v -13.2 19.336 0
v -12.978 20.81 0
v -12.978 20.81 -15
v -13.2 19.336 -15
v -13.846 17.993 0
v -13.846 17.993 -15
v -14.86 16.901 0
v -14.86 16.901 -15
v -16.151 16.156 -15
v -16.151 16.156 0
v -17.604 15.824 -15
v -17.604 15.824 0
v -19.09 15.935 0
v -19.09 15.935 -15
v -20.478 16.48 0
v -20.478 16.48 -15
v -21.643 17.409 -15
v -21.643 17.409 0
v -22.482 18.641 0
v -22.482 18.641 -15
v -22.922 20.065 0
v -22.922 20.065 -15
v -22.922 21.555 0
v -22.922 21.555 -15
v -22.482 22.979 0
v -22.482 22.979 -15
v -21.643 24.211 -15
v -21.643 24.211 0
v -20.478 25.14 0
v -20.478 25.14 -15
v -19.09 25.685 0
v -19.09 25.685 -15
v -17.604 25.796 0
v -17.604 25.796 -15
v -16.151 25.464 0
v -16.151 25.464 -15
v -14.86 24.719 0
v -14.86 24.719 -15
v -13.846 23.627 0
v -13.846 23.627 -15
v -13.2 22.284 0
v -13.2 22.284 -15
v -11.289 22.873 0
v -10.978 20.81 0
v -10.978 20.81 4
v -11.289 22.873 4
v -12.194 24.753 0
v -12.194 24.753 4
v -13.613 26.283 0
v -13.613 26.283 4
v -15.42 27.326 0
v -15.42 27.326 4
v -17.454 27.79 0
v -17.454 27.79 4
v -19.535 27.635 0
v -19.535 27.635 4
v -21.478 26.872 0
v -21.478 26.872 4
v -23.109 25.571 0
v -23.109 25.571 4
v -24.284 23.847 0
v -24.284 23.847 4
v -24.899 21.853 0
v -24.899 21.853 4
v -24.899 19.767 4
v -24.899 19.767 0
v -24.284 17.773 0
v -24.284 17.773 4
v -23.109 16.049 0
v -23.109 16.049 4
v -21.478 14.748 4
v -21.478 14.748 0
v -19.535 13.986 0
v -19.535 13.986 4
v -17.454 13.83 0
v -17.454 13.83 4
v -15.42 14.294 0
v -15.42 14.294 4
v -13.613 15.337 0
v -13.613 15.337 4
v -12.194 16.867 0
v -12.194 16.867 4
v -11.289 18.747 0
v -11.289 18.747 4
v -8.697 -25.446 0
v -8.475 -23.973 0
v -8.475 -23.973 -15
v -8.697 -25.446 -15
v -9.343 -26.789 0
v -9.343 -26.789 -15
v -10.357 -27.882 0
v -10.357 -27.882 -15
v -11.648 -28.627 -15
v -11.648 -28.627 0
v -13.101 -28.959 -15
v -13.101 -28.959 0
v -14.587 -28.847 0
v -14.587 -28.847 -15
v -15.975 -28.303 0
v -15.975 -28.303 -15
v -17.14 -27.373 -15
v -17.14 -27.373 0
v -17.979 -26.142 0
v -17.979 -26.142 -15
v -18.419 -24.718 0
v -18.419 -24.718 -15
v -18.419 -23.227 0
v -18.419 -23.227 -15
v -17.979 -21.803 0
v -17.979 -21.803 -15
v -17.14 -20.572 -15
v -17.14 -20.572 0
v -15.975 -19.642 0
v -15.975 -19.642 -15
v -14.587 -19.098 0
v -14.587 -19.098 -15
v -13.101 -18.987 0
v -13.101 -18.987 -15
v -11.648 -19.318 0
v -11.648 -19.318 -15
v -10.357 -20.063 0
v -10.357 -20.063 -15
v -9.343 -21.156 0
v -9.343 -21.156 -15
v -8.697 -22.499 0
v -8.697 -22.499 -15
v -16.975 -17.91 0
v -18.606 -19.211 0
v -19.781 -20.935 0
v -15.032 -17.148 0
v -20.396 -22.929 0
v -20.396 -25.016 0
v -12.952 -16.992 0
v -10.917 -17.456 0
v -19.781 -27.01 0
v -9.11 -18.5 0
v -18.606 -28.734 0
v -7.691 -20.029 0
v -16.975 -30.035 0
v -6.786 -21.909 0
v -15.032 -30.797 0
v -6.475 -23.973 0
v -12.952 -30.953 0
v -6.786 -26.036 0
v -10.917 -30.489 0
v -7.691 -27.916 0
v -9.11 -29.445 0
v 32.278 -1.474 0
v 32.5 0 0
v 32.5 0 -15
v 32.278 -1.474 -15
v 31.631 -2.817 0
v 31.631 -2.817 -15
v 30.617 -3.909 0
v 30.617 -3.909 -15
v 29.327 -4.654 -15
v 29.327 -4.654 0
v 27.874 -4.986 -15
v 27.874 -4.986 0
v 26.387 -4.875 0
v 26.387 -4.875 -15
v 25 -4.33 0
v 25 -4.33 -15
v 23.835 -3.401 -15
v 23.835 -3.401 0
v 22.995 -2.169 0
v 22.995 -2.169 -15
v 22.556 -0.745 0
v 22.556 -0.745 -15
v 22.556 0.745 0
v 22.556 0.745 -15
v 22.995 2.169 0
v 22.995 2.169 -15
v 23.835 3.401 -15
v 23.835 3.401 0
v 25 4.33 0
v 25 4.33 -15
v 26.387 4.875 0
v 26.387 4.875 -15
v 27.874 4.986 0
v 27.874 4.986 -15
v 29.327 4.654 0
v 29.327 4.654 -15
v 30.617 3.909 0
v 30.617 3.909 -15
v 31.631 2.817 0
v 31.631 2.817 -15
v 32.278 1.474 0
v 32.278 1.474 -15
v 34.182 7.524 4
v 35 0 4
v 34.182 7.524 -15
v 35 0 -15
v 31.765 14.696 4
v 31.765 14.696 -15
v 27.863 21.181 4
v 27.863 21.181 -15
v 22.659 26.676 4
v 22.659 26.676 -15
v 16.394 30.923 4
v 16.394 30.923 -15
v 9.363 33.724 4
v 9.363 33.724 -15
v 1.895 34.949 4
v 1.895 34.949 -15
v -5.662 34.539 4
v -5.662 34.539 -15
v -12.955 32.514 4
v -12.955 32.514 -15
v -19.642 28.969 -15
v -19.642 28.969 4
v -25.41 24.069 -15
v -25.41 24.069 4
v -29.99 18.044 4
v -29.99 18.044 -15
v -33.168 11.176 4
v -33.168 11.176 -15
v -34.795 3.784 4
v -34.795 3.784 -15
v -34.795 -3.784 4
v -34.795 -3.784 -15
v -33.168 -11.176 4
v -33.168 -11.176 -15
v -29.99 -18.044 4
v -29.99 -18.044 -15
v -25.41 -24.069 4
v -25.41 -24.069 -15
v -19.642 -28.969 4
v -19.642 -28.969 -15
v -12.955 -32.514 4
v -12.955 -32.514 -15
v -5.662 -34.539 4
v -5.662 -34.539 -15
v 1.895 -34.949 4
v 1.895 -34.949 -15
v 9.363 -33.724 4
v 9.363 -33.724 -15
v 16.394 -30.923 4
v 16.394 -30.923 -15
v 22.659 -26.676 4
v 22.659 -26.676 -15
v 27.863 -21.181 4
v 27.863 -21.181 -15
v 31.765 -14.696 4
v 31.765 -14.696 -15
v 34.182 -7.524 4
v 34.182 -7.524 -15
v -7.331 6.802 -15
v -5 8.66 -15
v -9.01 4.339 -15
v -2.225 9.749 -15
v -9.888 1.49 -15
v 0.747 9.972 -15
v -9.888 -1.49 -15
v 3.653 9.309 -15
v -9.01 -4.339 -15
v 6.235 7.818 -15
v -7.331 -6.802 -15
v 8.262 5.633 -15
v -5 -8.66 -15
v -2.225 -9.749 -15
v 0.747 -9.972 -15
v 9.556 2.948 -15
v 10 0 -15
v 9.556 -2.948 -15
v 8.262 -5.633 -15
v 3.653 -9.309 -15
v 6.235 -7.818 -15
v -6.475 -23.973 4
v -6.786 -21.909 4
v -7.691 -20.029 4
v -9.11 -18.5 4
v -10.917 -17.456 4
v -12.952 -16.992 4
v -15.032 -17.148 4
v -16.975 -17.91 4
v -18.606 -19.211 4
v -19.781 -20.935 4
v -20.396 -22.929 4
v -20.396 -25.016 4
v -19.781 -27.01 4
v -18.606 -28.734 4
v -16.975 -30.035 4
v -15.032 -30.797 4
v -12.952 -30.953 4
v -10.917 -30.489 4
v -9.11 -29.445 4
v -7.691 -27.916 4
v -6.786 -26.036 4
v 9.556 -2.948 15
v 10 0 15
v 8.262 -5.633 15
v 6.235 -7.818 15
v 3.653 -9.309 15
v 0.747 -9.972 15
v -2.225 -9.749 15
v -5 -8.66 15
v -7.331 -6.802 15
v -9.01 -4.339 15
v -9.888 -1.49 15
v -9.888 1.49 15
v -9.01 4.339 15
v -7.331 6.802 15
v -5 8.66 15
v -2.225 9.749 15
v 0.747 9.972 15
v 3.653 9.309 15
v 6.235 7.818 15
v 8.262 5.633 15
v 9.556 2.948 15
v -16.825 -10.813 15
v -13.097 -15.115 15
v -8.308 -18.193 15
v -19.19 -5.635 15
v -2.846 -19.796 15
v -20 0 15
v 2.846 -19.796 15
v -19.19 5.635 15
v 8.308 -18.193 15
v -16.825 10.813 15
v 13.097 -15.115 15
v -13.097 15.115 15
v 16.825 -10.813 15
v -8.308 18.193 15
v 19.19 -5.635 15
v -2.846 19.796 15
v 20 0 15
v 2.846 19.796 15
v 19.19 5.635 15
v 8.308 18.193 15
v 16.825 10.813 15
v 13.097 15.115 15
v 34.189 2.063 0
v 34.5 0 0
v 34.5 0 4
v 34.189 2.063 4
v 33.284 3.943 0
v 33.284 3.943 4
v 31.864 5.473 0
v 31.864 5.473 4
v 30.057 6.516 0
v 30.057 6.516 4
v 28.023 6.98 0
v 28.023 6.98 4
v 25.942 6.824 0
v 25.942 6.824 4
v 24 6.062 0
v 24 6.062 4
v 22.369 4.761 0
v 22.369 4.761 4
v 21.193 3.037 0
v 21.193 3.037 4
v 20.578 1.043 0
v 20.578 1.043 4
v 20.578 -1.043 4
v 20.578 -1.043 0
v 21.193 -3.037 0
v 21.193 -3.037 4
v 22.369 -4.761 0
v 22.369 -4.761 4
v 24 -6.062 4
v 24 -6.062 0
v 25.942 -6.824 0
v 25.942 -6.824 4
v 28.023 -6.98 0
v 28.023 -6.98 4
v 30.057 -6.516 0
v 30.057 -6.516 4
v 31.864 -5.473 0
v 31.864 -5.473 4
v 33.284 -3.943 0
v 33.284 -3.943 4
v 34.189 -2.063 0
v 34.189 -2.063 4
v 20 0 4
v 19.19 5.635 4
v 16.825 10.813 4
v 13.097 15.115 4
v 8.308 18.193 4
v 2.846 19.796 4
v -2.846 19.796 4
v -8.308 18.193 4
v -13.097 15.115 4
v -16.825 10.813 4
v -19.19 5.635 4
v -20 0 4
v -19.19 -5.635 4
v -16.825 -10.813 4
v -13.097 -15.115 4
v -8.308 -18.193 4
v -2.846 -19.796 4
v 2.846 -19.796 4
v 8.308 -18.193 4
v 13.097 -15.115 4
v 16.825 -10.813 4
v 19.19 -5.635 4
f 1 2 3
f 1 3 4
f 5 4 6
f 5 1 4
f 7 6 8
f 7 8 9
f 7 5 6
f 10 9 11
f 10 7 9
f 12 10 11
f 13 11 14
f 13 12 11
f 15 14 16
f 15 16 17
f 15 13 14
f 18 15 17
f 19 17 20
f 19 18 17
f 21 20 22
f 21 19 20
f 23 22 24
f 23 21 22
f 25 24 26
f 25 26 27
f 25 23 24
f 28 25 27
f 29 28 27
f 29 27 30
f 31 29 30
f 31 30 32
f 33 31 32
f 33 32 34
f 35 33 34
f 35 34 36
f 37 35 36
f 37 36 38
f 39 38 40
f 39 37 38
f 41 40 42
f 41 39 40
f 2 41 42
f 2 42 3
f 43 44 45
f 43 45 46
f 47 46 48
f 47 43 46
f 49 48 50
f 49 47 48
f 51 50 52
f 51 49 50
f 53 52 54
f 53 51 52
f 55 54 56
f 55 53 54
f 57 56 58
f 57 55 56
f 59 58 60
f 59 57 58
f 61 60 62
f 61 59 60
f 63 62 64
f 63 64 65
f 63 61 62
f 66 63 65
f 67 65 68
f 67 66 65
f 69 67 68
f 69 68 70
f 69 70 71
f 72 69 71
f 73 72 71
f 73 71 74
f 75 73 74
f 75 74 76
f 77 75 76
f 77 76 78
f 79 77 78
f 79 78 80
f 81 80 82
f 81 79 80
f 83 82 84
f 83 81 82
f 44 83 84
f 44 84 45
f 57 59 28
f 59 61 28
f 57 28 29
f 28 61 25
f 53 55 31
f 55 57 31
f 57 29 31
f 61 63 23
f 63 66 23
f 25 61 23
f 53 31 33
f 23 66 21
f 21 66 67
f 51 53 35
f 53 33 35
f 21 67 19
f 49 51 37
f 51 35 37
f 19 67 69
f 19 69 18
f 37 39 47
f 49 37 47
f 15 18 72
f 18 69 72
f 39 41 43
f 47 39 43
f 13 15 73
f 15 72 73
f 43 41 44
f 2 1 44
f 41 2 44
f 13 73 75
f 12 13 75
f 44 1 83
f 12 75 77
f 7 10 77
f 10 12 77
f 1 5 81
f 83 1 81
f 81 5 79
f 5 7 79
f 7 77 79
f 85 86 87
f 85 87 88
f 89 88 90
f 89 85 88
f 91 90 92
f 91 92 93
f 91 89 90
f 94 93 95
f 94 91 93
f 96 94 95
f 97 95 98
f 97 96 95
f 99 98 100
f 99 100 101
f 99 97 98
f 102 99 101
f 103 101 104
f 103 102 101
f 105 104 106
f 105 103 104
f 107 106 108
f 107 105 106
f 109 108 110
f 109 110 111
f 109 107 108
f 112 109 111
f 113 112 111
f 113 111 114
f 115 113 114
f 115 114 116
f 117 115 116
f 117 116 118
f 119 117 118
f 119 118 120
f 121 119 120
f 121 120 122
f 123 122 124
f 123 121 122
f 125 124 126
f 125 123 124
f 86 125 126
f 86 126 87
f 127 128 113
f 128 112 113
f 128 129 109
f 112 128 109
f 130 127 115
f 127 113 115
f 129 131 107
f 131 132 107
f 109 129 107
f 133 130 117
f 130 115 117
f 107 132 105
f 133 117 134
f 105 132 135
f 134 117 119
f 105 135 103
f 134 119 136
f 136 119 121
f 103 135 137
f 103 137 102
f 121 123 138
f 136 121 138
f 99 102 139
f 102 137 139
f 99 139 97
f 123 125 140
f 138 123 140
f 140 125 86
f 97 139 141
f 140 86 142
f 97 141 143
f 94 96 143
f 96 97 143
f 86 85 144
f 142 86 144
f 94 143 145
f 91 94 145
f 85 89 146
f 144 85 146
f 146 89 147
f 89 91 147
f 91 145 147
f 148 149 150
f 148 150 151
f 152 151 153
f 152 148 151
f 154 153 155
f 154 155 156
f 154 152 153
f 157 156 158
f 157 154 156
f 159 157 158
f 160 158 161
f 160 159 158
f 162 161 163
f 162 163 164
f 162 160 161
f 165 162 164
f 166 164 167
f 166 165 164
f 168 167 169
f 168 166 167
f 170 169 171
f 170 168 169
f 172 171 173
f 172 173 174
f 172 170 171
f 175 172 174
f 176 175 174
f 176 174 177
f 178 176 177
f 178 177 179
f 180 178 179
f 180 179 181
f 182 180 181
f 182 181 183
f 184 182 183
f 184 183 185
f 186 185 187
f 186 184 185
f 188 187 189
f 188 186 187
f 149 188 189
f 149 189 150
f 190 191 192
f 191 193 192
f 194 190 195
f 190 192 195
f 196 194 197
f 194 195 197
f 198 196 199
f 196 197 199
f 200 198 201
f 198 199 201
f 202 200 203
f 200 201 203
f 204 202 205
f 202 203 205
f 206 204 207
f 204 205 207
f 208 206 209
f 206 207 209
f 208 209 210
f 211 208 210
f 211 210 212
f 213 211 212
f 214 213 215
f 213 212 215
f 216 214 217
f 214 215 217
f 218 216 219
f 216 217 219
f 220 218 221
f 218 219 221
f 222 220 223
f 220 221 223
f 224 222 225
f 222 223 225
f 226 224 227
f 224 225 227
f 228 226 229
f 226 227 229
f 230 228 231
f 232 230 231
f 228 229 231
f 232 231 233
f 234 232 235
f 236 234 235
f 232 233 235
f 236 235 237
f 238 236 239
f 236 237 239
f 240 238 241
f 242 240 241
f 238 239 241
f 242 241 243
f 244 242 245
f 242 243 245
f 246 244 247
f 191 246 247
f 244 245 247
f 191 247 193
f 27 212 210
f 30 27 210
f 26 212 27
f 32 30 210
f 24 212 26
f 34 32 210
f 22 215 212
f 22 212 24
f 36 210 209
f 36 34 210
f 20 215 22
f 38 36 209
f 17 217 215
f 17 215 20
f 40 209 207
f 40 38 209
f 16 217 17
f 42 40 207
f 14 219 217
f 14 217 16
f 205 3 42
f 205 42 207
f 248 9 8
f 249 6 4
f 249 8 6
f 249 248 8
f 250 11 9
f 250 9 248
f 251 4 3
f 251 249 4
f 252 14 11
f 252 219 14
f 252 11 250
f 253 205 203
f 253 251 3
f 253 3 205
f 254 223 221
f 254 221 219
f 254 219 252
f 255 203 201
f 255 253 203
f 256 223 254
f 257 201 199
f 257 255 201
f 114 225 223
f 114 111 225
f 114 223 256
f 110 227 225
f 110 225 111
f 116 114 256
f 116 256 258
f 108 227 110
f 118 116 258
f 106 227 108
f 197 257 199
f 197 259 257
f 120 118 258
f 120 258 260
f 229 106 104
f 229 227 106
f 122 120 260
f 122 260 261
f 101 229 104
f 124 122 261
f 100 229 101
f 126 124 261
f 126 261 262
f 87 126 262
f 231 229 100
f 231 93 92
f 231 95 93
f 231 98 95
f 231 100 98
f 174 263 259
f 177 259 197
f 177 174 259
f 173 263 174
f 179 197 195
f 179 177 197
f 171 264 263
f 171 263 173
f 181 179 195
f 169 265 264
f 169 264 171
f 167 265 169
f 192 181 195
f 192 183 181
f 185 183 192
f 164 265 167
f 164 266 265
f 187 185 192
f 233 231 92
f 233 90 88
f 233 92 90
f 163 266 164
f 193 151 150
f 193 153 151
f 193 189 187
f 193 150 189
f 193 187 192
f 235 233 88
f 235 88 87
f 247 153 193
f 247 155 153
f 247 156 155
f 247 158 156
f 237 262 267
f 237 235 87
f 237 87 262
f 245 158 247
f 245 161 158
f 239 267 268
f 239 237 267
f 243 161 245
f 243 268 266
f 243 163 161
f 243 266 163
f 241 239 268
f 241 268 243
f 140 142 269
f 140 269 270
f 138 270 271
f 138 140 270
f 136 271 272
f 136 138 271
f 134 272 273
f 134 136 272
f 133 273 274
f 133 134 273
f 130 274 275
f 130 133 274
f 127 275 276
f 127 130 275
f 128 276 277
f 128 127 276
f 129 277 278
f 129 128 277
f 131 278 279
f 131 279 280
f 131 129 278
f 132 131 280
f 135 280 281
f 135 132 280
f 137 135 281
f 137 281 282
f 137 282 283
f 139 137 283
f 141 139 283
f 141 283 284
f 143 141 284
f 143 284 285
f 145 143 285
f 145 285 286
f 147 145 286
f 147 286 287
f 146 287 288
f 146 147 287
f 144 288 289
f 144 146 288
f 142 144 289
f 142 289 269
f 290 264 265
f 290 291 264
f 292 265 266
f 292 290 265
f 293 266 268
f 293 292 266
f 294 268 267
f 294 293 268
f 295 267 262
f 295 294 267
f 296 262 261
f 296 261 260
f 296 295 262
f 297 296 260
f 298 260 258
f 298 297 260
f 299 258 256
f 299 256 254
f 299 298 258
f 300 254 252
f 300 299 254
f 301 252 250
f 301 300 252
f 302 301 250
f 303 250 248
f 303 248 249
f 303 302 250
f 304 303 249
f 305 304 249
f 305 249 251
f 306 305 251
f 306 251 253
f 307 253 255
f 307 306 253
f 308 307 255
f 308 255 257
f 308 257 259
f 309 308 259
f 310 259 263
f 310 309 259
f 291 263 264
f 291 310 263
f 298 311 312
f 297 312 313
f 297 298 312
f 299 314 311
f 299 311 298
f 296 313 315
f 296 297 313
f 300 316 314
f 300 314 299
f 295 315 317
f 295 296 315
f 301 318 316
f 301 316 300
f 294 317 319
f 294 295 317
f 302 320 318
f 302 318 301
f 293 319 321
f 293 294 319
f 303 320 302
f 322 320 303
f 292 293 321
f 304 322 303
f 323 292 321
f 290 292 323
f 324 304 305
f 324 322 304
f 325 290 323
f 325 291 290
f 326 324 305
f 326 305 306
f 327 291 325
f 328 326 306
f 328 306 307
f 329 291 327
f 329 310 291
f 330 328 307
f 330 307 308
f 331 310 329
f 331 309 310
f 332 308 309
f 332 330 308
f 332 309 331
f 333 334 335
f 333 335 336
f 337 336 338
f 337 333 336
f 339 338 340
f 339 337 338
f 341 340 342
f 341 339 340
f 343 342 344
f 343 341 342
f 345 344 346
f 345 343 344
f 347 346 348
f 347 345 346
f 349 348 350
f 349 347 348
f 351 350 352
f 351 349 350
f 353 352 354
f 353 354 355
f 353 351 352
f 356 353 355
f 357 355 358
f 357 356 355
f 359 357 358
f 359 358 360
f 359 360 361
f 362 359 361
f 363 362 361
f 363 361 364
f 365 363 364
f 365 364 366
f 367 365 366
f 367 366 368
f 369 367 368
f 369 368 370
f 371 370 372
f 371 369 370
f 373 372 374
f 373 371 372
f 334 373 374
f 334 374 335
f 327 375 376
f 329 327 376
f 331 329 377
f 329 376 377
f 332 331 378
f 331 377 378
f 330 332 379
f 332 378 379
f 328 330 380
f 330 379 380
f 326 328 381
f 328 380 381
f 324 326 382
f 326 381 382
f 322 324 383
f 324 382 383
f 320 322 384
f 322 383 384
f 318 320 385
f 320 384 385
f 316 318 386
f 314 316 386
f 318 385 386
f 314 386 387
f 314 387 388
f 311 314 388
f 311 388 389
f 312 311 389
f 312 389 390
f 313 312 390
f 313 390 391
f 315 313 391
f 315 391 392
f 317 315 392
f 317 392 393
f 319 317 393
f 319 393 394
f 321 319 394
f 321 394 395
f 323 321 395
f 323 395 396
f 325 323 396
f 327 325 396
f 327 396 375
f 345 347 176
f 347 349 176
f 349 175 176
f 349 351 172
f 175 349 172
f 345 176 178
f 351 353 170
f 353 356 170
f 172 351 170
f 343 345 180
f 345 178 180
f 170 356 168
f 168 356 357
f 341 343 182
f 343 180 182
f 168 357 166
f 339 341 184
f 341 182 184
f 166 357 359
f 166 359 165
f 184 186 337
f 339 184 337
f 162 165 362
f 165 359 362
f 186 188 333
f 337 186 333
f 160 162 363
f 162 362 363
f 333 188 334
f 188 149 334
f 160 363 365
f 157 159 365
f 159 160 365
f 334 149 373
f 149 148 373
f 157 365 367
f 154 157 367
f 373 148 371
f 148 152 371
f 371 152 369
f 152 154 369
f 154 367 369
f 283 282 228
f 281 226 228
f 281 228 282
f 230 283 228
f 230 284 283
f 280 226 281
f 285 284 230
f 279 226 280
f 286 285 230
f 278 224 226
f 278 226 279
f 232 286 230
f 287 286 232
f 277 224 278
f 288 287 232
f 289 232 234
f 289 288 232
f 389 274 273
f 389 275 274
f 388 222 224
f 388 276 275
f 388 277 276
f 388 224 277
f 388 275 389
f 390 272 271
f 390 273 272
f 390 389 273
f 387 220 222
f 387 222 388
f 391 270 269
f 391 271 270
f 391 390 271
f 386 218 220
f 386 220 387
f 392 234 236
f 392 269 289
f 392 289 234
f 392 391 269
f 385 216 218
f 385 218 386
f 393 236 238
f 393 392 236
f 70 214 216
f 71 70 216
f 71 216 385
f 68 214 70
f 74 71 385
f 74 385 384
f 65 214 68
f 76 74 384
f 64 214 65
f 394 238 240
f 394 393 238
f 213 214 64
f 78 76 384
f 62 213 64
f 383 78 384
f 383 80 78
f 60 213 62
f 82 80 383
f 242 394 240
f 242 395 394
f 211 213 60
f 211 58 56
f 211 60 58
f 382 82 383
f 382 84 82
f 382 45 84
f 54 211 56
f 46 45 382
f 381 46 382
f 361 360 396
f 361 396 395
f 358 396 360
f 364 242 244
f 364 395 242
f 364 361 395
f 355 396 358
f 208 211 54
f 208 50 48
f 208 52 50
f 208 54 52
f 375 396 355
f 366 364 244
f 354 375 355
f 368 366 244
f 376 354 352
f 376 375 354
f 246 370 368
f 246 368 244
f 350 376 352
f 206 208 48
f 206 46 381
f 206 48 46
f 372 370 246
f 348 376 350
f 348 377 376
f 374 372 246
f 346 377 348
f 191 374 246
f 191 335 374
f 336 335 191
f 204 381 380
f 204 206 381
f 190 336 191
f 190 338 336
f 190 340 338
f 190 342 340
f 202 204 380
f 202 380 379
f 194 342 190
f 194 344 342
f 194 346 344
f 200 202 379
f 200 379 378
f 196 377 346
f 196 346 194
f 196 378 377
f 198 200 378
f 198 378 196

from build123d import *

# Parameters (mm, degrees)
F0_R     = 20
F0_R_2   = 10
F1_DEPTH = 15
F2_R     = 35
F2_R_2   = 5
F2_R_3   = 10
F3_DEPTH = 15
F4_R     = 35
F4_R_2   = 7
F4_R_3   = 20
F5_DEPTH = 4


with BuildPart() as f1:
    # F0 (on Top) → F1 (new body)
    with BuildSketch(Plane.XY):
        Circle(F0_R)
        Circle(F0_R_2, mode=Mode.SUBTRACT)
    extrude(amount=F1_DEPTH)

    # F2 (on face) → F3 (join)
    with BuildSketch(Plane(origin=(0, 0, 0), x_dir=(1, 0, 0), z_dir=(0, 0, -1))):
        Circle(F2_R)
        with Locations((-17.977587, -20.810006)):
            Circle(F2_R_2, mode=Mode.SUBTRACT)
        with Locations((-13.474644, 23.972567)):
            Circle(F2_R_2, mode=Mode.SUBTRACT)
        Circle(F2_R_3, mode=Mode.SUBTRACT)
        with Locations((27.5, 0)):
            Circle(F2_R_2, mode=Mode.SUBTRACT)
    extrude(amount=F3_DEPTH)

    # F4 (on face) → F5 (join)
    with BuildSketch(Plane.XY):
        Circle(F4_R)
        with Locations((-13.474644, -23.972567)):
            Circle(F4_R_2, mode=Mode.SUBTRACT)
        with Locations((-17.977587, 20.810006)):
            Circle(F4_R_2, mode=Mode.SUBTRACT)
        Circle(F4_R_3, mode=Mode.SUBTRACT)
        with Locations((27.5, 0)):
            Circle(F4_R_2, mode=Mode.SUBTRACT)
    extrude(amount=F5_DEPTH)


solid = f1.part
